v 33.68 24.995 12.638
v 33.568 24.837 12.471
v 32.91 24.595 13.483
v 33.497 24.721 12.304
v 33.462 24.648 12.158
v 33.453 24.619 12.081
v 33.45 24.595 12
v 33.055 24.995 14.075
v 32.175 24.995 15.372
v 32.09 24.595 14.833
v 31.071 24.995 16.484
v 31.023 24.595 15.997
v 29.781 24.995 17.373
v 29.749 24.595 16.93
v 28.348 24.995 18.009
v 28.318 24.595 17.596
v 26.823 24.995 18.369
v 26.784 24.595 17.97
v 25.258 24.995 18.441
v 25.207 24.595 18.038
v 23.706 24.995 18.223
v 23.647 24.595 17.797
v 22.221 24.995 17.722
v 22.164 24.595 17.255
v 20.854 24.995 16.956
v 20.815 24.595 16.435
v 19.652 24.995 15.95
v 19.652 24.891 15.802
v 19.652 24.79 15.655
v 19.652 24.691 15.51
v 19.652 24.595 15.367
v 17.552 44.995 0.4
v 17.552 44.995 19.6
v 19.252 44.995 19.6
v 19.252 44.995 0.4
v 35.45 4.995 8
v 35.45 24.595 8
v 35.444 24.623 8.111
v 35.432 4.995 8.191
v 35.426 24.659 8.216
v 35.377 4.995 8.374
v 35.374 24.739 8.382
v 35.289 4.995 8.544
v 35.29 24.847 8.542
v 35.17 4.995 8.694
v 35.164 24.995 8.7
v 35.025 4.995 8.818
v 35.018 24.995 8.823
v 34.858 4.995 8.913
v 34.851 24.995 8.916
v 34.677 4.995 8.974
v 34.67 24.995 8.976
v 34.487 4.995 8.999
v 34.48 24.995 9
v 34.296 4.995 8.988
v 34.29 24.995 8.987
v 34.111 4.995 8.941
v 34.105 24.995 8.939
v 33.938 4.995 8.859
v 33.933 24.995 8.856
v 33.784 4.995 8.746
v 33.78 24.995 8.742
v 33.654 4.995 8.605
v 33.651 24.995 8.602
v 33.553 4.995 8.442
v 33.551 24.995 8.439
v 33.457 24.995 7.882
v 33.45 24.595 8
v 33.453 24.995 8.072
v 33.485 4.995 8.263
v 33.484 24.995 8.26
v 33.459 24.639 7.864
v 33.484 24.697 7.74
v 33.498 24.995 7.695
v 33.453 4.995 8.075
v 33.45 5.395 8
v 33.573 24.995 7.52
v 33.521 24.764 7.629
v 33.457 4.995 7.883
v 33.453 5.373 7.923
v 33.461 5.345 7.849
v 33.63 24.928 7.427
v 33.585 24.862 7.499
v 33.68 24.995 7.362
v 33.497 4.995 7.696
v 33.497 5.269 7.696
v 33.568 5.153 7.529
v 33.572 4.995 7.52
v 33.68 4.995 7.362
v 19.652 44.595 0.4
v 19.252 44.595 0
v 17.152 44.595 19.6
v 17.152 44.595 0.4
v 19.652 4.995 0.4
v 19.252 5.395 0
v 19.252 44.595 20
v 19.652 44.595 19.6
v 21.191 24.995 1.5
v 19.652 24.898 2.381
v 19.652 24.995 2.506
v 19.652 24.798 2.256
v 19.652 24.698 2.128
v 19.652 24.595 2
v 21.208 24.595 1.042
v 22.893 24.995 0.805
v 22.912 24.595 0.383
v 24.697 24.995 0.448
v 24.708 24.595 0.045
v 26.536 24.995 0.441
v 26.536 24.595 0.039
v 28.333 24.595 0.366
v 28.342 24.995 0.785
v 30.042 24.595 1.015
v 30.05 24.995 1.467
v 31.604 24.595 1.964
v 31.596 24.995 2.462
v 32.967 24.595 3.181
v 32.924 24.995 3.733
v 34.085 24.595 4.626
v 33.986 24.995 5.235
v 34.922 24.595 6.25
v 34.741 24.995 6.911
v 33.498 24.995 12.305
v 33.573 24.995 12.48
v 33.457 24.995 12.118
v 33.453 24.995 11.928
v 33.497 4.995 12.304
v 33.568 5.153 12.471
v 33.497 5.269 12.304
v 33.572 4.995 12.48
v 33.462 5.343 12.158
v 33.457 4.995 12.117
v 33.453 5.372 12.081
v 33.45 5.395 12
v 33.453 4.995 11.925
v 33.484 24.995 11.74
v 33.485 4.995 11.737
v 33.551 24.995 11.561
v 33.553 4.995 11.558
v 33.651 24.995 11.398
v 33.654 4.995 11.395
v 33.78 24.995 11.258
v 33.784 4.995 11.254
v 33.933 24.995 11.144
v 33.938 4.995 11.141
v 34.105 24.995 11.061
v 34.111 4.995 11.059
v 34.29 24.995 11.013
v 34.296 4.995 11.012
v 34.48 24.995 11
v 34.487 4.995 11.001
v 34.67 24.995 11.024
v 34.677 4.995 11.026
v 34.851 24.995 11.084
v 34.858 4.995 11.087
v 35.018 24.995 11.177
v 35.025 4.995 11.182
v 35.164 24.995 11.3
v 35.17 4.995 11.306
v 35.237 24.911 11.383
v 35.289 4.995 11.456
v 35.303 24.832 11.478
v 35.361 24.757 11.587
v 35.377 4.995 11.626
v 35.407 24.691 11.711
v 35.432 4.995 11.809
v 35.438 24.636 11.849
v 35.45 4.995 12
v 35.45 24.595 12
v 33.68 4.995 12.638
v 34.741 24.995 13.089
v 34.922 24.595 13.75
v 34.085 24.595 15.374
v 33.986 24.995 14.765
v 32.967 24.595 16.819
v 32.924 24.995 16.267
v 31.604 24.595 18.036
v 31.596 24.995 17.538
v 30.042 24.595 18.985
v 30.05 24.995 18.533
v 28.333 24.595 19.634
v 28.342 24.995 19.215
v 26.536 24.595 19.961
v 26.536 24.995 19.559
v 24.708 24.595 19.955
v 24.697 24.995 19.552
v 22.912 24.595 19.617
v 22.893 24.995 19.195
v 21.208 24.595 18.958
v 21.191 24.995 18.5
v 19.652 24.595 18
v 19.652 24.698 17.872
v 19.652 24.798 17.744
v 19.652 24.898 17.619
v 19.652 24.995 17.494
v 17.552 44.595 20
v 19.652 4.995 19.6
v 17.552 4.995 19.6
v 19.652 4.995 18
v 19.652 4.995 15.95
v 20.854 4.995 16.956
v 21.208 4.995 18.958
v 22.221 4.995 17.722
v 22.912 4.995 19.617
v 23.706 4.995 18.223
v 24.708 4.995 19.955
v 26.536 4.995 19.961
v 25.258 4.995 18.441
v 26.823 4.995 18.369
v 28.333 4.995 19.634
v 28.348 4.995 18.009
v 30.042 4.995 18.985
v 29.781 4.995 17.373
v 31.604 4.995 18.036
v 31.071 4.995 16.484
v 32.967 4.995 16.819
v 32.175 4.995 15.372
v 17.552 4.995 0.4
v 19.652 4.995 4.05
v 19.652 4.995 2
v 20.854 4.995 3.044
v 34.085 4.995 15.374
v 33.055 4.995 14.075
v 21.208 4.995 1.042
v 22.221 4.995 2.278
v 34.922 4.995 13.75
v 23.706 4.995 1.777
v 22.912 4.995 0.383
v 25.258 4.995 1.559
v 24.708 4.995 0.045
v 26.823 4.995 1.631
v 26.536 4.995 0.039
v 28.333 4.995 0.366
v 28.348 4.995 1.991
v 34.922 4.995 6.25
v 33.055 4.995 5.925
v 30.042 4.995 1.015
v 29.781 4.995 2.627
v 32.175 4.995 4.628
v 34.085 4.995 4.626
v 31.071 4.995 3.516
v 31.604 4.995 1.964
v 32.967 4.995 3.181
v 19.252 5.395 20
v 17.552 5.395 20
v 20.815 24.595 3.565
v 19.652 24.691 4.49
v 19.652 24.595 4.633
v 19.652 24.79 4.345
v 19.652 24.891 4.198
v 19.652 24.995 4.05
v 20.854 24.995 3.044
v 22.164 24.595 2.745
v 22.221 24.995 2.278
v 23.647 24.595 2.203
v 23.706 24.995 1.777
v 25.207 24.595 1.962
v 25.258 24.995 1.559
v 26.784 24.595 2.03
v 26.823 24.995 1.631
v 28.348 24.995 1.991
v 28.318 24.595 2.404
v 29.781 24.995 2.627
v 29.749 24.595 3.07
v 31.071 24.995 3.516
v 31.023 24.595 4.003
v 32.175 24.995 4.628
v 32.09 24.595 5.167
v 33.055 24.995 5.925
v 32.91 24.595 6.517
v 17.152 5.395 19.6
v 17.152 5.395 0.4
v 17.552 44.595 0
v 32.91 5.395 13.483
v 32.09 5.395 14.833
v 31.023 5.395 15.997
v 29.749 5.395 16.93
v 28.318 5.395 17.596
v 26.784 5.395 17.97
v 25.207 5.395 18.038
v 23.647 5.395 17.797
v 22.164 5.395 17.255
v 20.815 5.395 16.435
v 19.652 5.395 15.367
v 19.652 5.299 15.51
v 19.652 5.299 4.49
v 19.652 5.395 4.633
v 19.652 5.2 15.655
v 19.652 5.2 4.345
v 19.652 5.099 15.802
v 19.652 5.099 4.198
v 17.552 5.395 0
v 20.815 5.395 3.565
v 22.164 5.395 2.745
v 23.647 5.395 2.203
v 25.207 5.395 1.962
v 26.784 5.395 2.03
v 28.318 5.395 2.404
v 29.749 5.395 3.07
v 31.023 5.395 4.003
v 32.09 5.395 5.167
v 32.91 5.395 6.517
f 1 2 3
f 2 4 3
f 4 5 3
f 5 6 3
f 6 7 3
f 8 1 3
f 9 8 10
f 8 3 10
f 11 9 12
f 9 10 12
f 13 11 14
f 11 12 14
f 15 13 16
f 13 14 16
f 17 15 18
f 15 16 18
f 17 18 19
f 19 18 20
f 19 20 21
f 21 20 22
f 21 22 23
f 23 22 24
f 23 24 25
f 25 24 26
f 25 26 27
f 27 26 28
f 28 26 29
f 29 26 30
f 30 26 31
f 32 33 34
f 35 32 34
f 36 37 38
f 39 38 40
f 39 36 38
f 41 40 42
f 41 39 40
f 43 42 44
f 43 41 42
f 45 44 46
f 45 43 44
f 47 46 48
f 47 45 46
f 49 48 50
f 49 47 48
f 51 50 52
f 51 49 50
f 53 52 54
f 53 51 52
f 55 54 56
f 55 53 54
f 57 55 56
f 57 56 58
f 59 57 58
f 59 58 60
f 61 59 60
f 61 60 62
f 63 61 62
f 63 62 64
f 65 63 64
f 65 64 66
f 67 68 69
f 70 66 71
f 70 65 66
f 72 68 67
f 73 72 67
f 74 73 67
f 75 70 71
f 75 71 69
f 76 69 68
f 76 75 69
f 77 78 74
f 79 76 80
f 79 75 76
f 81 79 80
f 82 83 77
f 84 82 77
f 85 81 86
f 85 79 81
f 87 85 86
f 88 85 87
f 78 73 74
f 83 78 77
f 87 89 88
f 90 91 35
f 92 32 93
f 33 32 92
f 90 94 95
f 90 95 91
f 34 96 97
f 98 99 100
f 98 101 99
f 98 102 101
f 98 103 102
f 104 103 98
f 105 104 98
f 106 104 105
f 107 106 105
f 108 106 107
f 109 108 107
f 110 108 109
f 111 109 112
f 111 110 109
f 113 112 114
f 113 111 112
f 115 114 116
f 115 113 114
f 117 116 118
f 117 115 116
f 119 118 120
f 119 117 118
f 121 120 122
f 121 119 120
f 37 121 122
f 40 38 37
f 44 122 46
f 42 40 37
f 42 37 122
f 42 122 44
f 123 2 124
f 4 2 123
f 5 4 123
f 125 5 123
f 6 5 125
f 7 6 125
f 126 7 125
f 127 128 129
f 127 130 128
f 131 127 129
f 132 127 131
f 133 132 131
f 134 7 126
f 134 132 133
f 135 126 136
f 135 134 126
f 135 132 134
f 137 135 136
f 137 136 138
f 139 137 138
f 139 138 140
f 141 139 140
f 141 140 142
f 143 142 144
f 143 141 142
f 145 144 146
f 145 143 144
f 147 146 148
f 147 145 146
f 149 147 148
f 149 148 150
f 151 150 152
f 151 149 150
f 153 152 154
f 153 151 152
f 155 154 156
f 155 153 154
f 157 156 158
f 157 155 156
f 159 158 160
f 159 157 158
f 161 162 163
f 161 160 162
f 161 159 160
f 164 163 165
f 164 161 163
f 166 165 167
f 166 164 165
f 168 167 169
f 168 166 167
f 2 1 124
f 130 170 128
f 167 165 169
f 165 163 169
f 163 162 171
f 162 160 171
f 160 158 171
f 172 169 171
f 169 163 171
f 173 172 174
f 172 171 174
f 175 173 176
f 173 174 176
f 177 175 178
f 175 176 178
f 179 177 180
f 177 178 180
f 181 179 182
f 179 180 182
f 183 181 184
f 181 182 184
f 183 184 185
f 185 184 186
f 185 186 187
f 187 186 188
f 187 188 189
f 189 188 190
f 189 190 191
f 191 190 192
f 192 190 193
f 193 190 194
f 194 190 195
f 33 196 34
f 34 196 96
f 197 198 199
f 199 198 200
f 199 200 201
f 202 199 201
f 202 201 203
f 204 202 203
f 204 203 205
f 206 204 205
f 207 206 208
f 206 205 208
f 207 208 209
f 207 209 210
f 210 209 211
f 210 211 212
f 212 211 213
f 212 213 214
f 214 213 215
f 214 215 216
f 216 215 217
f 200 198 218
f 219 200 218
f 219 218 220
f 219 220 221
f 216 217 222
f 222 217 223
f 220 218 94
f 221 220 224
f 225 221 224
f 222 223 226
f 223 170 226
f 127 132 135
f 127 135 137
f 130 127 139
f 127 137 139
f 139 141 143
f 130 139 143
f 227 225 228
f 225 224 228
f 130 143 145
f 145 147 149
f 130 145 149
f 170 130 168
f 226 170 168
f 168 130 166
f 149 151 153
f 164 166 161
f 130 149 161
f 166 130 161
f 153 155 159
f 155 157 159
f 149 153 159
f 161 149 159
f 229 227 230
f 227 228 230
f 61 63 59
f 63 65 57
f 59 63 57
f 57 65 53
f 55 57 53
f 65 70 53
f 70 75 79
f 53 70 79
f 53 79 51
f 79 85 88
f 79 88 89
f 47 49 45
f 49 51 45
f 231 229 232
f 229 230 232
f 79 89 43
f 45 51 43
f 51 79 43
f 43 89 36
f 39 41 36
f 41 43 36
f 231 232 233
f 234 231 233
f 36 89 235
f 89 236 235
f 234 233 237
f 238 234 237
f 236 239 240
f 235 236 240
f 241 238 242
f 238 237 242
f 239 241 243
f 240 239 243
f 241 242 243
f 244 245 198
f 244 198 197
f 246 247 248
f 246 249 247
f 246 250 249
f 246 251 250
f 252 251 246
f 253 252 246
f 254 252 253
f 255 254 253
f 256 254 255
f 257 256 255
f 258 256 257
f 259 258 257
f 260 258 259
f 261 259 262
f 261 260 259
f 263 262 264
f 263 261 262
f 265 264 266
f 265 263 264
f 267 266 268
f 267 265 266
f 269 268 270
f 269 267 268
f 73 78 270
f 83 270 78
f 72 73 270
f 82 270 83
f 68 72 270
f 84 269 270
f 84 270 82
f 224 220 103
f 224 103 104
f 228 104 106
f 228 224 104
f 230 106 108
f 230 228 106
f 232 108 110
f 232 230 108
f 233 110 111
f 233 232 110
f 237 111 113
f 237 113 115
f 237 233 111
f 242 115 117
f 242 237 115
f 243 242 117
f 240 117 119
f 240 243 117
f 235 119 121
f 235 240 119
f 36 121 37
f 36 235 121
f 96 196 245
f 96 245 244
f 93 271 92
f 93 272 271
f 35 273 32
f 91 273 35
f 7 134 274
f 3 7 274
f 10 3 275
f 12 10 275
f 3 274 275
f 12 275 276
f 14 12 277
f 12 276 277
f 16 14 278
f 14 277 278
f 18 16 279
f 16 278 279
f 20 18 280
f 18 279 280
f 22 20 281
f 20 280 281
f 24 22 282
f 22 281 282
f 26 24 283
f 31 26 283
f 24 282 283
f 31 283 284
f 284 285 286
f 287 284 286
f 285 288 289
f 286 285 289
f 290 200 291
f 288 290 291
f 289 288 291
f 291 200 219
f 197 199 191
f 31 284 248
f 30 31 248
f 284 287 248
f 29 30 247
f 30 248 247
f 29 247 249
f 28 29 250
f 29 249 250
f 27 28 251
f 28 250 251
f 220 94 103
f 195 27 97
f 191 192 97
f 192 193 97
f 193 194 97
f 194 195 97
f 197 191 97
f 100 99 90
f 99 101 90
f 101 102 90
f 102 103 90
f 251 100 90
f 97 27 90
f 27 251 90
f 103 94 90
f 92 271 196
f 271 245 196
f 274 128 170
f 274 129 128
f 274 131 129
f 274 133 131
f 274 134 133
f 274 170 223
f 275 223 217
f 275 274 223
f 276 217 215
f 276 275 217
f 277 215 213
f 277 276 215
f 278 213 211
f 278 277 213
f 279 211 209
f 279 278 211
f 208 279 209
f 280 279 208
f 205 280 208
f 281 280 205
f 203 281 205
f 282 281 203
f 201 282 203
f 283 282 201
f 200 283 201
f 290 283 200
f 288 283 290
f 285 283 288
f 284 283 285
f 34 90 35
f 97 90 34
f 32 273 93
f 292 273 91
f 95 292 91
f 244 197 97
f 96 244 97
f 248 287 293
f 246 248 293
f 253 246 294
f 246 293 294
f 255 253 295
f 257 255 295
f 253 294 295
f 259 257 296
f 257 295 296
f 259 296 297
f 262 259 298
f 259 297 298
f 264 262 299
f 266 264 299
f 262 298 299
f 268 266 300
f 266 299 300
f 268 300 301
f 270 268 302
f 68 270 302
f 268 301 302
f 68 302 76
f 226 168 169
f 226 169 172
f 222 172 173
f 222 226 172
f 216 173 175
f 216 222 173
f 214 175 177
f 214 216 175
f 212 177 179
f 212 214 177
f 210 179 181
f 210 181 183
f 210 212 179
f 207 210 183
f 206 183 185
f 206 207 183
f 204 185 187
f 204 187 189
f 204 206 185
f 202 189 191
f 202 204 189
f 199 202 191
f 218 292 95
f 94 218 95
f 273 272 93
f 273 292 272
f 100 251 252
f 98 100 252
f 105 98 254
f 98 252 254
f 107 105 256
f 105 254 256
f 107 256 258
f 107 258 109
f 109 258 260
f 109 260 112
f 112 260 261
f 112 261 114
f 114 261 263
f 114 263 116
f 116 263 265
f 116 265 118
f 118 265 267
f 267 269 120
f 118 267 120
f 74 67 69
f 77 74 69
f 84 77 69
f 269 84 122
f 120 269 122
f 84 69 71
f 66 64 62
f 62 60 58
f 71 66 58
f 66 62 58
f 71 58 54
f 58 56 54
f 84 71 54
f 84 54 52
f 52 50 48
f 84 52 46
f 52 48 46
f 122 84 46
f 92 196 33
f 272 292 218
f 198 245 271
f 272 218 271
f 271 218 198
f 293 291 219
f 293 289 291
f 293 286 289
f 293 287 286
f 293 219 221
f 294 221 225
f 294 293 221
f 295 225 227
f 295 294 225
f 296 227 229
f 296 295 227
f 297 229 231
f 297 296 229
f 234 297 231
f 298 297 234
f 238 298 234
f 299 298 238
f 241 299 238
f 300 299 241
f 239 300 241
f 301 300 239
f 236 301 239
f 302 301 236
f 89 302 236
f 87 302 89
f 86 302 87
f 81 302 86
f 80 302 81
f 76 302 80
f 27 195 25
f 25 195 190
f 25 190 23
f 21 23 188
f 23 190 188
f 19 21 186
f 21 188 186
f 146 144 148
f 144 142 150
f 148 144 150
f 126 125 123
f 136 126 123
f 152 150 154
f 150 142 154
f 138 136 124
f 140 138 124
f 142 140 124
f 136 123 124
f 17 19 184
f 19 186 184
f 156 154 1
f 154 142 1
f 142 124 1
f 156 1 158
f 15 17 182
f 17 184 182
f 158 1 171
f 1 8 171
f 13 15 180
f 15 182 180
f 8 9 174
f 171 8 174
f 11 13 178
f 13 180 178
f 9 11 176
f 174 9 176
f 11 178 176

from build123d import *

# Parameters (mm, degrees)
SKETCH001_W     = 2.5
SKETCH001_H     = 40
PAD001_DEPTH    = 20
PAD002_DEPTH    = 20
CHAMFER001_SIZE = 0.4


with BuildPart() as part:
    # Sketch001 → Pad001 (new body)
    with BuildSketch(Plane.XY):
        with Locations((18.401947, 24.9952)):
            Rectangle(SKETCH001_W, SKETCH001_H)
    extrude(amount=PAD001_DEPTH)

    # Sketch002 (on Face4 of Pad001) → Pad002 (join)
    with BuildSketch(Plane.XZ.offset(-4.9952)):
        with BuildLine():
            ThreePointArc((35.449906, 12), (29.202457, 19.348469), (19.651947, 18))
            Line((19.651947, 18), (19.651947, 15.367324))
            ThreePointArc((33.449906, 12), (27.56058, 17.820824), (19.651947, 15.367324))
            ThreePointArc((33.449906, 12), (34.449906, 11), (35.449906, 12))
        make_face()
        with BuildLine():
            ThreePointArc((19.651947, 2), (29.202457, 0.651531), (35.449906, 8))
            ThreePointArc((35.449906, 8), (34.449906, 9), (33.449906, 8))
            ThreePointArc((19.651947, 4.632676), (27.56058, 2.179176), (33.449906, 8))
            Line((19.651947, 4.632676), (19.651947, 2))
        make_face()
    extrude(amount=-PAD002_DEPTH)

    # Chamfer001
    chamfer001_edges = [part.edges().sort_by_distance(p)[0] for p in [
        (19.651947, 24.9952, 20),
        (18.401947, 44.9952, 20),
        (17.151947, 24.9952, 20),
        (18.401947, 4.9952, 20),
        (19.651947, 24.9952, 0),
        (18.401947, 44.9952, 0),
        (17.151947, 24.9952, 0),
        (18.401947, 4.9952, 0),
        (19.651947, 44.9952, 10),
        (17.151947, 44.9952, 10),
        (17.151947, 4.9952, 10),
        (29.202457, 24.9952, 19.348469),
        (29.202457, 24.9952, 0.651531),
        (27.56058, 24.9952, 17.820824),
        (27.56058, 24.9952, 2.179176),
        (27.56058, 4.9952, 17.820824),
        (27.56058, 4.9952, 2.179176),
    ]]
    chamfer(chamfer001_edges, length=CHAMFER001_SIZE)


solid = part.part
